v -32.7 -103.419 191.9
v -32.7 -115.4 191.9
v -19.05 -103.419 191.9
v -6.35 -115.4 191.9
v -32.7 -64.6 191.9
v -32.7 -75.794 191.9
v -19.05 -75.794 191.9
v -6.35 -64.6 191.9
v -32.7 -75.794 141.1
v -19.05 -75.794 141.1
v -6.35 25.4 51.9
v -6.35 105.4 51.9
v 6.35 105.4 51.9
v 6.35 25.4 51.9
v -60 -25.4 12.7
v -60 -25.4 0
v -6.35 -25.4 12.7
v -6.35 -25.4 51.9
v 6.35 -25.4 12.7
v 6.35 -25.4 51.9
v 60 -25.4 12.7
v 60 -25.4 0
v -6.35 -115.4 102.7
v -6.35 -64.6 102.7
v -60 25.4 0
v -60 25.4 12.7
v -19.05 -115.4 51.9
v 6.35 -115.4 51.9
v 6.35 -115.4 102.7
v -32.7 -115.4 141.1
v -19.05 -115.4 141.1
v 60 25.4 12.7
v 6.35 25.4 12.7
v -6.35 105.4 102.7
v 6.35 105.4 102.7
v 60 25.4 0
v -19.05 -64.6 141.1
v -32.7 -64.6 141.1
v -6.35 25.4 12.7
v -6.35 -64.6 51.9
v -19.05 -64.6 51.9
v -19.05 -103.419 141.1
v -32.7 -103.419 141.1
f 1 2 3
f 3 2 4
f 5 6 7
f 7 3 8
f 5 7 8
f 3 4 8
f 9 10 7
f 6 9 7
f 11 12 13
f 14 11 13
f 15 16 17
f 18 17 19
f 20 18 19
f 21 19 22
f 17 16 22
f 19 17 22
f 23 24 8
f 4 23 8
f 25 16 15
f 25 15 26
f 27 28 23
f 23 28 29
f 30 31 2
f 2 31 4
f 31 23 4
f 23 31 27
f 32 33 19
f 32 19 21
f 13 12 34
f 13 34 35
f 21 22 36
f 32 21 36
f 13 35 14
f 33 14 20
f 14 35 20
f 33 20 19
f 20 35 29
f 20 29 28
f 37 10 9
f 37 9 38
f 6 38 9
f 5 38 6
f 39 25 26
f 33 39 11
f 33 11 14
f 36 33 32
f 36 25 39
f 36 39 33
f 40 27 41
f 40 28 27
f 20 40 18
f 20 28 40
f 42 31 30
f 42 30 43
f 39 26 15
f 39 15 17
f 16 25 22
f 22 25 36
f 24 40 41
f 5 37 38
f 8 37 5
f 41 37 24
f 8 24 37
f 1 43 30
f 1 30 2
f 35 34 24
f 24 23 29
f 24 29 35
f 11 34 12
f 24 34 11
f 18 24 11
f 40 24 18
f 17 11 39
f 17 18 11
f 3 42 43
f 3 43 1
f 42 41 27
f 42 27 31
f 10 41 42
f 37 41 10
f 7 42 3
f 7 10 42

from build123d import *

# Parameters (mm, degrees)
CROQUIS1_W              = 120
CROQUIS1_H              = 50.8
SALIENTE_EXTRUIR1_DEPTH = 12.7
CROQUIS2_W              = 12.7
CROQUIS2_H              = 50.8
SALIENTE_EXTRUIR2_DEPTH = 90
CROQUIS3_W              = 12.7
CROQUIS3_H              = 50.8
SALIENTE_EXTRUIR3_DEPTH = 90
CROQUIS4_W              = 140
CROQUIS4_H              = 50.8
SALIENTE_EXTRUIR4_DEPTH = 12.7
CROQUIS5_W              = 50.8
CROQUIS5_H              = 11.980562802
CROQUIS5_H_2            = 11.193759738
SALIENTE_EXTRUIR5_DEPTH = 13.65
CROQUIS6_W              = 12.7
CROQUIS6_H              = 50.8
SALIENTE_EXTRUIR6_DEPTH = 80


with BuildPart() as part:
    # Croquis1 → Saliente-Extruir1 (new body)
    with BuildSketch(Plane.XY):
        Rectangle(CROQUIS1_W, CROQUIS1_H)
    extrude(amount=SALIENTE_EXTRUIR1_DEPTH)

    # Croquis2 → Saliente-Extruir2 (add)
    with BuildSketch(Plane.XY.offset(12.7)):
        Rectangle(CROQUIS2_W, CROQUIS2_H)
    extrude(amount=SALIENTE_EXTRUIR2_DEPTH)

    # Croquis3 → Saliente-Extruir3 (add)
    with BuildSketch(Plane.XZ.offset(25.4)):
        with Locations((0, 77.3)):
            Rectangle(CROQUIS3_W, CROQUIS3_H)
    extrude(amount=SALIENTE_EXTRUIR3_DEPTH)

    # Croquis4 → Saliente-Extruir4 (add)
    with BuildSketch(Plane.ZY.offset(6.35)):
        with Locations((121.9, -90)):
            Rectangle(CROQUIS4_W, CROQUIS4_H)
    extrude(amount=SALIENTE_EXTRUIR4_DEPTH)

    # Croquis5 → Saliente-Extruir5 (add)
    with BuildSketch(Plane.ZY.offset(19.05)):
        with Locations((166.5, -109.409718599)):
            Rectangle(CROQUIS5_W, CROQUIS5_H)
        with Locations((166.5, -70.196879869)):
            Rectangle(CROQUIS5_W, CROQUIS5_H_2)
    extrude(amount=SALIENTE_EXTRUIR5_DEPTH)

    # Croquis6 → Saliente-Extruir6 (add)
    with BuildSketch(Plane(origin=(0, 25.4, 0), x_dir=(1, 0, 0), z_dir=(0, 1, 0))):
        with Locations((0, -77.3)):
            Rectangle(CROQUIS6_W, CROQUIS6_H)
    extrude(amount=SALIENTE_EXTRUIR6_DEPTH)


solid = part.part
